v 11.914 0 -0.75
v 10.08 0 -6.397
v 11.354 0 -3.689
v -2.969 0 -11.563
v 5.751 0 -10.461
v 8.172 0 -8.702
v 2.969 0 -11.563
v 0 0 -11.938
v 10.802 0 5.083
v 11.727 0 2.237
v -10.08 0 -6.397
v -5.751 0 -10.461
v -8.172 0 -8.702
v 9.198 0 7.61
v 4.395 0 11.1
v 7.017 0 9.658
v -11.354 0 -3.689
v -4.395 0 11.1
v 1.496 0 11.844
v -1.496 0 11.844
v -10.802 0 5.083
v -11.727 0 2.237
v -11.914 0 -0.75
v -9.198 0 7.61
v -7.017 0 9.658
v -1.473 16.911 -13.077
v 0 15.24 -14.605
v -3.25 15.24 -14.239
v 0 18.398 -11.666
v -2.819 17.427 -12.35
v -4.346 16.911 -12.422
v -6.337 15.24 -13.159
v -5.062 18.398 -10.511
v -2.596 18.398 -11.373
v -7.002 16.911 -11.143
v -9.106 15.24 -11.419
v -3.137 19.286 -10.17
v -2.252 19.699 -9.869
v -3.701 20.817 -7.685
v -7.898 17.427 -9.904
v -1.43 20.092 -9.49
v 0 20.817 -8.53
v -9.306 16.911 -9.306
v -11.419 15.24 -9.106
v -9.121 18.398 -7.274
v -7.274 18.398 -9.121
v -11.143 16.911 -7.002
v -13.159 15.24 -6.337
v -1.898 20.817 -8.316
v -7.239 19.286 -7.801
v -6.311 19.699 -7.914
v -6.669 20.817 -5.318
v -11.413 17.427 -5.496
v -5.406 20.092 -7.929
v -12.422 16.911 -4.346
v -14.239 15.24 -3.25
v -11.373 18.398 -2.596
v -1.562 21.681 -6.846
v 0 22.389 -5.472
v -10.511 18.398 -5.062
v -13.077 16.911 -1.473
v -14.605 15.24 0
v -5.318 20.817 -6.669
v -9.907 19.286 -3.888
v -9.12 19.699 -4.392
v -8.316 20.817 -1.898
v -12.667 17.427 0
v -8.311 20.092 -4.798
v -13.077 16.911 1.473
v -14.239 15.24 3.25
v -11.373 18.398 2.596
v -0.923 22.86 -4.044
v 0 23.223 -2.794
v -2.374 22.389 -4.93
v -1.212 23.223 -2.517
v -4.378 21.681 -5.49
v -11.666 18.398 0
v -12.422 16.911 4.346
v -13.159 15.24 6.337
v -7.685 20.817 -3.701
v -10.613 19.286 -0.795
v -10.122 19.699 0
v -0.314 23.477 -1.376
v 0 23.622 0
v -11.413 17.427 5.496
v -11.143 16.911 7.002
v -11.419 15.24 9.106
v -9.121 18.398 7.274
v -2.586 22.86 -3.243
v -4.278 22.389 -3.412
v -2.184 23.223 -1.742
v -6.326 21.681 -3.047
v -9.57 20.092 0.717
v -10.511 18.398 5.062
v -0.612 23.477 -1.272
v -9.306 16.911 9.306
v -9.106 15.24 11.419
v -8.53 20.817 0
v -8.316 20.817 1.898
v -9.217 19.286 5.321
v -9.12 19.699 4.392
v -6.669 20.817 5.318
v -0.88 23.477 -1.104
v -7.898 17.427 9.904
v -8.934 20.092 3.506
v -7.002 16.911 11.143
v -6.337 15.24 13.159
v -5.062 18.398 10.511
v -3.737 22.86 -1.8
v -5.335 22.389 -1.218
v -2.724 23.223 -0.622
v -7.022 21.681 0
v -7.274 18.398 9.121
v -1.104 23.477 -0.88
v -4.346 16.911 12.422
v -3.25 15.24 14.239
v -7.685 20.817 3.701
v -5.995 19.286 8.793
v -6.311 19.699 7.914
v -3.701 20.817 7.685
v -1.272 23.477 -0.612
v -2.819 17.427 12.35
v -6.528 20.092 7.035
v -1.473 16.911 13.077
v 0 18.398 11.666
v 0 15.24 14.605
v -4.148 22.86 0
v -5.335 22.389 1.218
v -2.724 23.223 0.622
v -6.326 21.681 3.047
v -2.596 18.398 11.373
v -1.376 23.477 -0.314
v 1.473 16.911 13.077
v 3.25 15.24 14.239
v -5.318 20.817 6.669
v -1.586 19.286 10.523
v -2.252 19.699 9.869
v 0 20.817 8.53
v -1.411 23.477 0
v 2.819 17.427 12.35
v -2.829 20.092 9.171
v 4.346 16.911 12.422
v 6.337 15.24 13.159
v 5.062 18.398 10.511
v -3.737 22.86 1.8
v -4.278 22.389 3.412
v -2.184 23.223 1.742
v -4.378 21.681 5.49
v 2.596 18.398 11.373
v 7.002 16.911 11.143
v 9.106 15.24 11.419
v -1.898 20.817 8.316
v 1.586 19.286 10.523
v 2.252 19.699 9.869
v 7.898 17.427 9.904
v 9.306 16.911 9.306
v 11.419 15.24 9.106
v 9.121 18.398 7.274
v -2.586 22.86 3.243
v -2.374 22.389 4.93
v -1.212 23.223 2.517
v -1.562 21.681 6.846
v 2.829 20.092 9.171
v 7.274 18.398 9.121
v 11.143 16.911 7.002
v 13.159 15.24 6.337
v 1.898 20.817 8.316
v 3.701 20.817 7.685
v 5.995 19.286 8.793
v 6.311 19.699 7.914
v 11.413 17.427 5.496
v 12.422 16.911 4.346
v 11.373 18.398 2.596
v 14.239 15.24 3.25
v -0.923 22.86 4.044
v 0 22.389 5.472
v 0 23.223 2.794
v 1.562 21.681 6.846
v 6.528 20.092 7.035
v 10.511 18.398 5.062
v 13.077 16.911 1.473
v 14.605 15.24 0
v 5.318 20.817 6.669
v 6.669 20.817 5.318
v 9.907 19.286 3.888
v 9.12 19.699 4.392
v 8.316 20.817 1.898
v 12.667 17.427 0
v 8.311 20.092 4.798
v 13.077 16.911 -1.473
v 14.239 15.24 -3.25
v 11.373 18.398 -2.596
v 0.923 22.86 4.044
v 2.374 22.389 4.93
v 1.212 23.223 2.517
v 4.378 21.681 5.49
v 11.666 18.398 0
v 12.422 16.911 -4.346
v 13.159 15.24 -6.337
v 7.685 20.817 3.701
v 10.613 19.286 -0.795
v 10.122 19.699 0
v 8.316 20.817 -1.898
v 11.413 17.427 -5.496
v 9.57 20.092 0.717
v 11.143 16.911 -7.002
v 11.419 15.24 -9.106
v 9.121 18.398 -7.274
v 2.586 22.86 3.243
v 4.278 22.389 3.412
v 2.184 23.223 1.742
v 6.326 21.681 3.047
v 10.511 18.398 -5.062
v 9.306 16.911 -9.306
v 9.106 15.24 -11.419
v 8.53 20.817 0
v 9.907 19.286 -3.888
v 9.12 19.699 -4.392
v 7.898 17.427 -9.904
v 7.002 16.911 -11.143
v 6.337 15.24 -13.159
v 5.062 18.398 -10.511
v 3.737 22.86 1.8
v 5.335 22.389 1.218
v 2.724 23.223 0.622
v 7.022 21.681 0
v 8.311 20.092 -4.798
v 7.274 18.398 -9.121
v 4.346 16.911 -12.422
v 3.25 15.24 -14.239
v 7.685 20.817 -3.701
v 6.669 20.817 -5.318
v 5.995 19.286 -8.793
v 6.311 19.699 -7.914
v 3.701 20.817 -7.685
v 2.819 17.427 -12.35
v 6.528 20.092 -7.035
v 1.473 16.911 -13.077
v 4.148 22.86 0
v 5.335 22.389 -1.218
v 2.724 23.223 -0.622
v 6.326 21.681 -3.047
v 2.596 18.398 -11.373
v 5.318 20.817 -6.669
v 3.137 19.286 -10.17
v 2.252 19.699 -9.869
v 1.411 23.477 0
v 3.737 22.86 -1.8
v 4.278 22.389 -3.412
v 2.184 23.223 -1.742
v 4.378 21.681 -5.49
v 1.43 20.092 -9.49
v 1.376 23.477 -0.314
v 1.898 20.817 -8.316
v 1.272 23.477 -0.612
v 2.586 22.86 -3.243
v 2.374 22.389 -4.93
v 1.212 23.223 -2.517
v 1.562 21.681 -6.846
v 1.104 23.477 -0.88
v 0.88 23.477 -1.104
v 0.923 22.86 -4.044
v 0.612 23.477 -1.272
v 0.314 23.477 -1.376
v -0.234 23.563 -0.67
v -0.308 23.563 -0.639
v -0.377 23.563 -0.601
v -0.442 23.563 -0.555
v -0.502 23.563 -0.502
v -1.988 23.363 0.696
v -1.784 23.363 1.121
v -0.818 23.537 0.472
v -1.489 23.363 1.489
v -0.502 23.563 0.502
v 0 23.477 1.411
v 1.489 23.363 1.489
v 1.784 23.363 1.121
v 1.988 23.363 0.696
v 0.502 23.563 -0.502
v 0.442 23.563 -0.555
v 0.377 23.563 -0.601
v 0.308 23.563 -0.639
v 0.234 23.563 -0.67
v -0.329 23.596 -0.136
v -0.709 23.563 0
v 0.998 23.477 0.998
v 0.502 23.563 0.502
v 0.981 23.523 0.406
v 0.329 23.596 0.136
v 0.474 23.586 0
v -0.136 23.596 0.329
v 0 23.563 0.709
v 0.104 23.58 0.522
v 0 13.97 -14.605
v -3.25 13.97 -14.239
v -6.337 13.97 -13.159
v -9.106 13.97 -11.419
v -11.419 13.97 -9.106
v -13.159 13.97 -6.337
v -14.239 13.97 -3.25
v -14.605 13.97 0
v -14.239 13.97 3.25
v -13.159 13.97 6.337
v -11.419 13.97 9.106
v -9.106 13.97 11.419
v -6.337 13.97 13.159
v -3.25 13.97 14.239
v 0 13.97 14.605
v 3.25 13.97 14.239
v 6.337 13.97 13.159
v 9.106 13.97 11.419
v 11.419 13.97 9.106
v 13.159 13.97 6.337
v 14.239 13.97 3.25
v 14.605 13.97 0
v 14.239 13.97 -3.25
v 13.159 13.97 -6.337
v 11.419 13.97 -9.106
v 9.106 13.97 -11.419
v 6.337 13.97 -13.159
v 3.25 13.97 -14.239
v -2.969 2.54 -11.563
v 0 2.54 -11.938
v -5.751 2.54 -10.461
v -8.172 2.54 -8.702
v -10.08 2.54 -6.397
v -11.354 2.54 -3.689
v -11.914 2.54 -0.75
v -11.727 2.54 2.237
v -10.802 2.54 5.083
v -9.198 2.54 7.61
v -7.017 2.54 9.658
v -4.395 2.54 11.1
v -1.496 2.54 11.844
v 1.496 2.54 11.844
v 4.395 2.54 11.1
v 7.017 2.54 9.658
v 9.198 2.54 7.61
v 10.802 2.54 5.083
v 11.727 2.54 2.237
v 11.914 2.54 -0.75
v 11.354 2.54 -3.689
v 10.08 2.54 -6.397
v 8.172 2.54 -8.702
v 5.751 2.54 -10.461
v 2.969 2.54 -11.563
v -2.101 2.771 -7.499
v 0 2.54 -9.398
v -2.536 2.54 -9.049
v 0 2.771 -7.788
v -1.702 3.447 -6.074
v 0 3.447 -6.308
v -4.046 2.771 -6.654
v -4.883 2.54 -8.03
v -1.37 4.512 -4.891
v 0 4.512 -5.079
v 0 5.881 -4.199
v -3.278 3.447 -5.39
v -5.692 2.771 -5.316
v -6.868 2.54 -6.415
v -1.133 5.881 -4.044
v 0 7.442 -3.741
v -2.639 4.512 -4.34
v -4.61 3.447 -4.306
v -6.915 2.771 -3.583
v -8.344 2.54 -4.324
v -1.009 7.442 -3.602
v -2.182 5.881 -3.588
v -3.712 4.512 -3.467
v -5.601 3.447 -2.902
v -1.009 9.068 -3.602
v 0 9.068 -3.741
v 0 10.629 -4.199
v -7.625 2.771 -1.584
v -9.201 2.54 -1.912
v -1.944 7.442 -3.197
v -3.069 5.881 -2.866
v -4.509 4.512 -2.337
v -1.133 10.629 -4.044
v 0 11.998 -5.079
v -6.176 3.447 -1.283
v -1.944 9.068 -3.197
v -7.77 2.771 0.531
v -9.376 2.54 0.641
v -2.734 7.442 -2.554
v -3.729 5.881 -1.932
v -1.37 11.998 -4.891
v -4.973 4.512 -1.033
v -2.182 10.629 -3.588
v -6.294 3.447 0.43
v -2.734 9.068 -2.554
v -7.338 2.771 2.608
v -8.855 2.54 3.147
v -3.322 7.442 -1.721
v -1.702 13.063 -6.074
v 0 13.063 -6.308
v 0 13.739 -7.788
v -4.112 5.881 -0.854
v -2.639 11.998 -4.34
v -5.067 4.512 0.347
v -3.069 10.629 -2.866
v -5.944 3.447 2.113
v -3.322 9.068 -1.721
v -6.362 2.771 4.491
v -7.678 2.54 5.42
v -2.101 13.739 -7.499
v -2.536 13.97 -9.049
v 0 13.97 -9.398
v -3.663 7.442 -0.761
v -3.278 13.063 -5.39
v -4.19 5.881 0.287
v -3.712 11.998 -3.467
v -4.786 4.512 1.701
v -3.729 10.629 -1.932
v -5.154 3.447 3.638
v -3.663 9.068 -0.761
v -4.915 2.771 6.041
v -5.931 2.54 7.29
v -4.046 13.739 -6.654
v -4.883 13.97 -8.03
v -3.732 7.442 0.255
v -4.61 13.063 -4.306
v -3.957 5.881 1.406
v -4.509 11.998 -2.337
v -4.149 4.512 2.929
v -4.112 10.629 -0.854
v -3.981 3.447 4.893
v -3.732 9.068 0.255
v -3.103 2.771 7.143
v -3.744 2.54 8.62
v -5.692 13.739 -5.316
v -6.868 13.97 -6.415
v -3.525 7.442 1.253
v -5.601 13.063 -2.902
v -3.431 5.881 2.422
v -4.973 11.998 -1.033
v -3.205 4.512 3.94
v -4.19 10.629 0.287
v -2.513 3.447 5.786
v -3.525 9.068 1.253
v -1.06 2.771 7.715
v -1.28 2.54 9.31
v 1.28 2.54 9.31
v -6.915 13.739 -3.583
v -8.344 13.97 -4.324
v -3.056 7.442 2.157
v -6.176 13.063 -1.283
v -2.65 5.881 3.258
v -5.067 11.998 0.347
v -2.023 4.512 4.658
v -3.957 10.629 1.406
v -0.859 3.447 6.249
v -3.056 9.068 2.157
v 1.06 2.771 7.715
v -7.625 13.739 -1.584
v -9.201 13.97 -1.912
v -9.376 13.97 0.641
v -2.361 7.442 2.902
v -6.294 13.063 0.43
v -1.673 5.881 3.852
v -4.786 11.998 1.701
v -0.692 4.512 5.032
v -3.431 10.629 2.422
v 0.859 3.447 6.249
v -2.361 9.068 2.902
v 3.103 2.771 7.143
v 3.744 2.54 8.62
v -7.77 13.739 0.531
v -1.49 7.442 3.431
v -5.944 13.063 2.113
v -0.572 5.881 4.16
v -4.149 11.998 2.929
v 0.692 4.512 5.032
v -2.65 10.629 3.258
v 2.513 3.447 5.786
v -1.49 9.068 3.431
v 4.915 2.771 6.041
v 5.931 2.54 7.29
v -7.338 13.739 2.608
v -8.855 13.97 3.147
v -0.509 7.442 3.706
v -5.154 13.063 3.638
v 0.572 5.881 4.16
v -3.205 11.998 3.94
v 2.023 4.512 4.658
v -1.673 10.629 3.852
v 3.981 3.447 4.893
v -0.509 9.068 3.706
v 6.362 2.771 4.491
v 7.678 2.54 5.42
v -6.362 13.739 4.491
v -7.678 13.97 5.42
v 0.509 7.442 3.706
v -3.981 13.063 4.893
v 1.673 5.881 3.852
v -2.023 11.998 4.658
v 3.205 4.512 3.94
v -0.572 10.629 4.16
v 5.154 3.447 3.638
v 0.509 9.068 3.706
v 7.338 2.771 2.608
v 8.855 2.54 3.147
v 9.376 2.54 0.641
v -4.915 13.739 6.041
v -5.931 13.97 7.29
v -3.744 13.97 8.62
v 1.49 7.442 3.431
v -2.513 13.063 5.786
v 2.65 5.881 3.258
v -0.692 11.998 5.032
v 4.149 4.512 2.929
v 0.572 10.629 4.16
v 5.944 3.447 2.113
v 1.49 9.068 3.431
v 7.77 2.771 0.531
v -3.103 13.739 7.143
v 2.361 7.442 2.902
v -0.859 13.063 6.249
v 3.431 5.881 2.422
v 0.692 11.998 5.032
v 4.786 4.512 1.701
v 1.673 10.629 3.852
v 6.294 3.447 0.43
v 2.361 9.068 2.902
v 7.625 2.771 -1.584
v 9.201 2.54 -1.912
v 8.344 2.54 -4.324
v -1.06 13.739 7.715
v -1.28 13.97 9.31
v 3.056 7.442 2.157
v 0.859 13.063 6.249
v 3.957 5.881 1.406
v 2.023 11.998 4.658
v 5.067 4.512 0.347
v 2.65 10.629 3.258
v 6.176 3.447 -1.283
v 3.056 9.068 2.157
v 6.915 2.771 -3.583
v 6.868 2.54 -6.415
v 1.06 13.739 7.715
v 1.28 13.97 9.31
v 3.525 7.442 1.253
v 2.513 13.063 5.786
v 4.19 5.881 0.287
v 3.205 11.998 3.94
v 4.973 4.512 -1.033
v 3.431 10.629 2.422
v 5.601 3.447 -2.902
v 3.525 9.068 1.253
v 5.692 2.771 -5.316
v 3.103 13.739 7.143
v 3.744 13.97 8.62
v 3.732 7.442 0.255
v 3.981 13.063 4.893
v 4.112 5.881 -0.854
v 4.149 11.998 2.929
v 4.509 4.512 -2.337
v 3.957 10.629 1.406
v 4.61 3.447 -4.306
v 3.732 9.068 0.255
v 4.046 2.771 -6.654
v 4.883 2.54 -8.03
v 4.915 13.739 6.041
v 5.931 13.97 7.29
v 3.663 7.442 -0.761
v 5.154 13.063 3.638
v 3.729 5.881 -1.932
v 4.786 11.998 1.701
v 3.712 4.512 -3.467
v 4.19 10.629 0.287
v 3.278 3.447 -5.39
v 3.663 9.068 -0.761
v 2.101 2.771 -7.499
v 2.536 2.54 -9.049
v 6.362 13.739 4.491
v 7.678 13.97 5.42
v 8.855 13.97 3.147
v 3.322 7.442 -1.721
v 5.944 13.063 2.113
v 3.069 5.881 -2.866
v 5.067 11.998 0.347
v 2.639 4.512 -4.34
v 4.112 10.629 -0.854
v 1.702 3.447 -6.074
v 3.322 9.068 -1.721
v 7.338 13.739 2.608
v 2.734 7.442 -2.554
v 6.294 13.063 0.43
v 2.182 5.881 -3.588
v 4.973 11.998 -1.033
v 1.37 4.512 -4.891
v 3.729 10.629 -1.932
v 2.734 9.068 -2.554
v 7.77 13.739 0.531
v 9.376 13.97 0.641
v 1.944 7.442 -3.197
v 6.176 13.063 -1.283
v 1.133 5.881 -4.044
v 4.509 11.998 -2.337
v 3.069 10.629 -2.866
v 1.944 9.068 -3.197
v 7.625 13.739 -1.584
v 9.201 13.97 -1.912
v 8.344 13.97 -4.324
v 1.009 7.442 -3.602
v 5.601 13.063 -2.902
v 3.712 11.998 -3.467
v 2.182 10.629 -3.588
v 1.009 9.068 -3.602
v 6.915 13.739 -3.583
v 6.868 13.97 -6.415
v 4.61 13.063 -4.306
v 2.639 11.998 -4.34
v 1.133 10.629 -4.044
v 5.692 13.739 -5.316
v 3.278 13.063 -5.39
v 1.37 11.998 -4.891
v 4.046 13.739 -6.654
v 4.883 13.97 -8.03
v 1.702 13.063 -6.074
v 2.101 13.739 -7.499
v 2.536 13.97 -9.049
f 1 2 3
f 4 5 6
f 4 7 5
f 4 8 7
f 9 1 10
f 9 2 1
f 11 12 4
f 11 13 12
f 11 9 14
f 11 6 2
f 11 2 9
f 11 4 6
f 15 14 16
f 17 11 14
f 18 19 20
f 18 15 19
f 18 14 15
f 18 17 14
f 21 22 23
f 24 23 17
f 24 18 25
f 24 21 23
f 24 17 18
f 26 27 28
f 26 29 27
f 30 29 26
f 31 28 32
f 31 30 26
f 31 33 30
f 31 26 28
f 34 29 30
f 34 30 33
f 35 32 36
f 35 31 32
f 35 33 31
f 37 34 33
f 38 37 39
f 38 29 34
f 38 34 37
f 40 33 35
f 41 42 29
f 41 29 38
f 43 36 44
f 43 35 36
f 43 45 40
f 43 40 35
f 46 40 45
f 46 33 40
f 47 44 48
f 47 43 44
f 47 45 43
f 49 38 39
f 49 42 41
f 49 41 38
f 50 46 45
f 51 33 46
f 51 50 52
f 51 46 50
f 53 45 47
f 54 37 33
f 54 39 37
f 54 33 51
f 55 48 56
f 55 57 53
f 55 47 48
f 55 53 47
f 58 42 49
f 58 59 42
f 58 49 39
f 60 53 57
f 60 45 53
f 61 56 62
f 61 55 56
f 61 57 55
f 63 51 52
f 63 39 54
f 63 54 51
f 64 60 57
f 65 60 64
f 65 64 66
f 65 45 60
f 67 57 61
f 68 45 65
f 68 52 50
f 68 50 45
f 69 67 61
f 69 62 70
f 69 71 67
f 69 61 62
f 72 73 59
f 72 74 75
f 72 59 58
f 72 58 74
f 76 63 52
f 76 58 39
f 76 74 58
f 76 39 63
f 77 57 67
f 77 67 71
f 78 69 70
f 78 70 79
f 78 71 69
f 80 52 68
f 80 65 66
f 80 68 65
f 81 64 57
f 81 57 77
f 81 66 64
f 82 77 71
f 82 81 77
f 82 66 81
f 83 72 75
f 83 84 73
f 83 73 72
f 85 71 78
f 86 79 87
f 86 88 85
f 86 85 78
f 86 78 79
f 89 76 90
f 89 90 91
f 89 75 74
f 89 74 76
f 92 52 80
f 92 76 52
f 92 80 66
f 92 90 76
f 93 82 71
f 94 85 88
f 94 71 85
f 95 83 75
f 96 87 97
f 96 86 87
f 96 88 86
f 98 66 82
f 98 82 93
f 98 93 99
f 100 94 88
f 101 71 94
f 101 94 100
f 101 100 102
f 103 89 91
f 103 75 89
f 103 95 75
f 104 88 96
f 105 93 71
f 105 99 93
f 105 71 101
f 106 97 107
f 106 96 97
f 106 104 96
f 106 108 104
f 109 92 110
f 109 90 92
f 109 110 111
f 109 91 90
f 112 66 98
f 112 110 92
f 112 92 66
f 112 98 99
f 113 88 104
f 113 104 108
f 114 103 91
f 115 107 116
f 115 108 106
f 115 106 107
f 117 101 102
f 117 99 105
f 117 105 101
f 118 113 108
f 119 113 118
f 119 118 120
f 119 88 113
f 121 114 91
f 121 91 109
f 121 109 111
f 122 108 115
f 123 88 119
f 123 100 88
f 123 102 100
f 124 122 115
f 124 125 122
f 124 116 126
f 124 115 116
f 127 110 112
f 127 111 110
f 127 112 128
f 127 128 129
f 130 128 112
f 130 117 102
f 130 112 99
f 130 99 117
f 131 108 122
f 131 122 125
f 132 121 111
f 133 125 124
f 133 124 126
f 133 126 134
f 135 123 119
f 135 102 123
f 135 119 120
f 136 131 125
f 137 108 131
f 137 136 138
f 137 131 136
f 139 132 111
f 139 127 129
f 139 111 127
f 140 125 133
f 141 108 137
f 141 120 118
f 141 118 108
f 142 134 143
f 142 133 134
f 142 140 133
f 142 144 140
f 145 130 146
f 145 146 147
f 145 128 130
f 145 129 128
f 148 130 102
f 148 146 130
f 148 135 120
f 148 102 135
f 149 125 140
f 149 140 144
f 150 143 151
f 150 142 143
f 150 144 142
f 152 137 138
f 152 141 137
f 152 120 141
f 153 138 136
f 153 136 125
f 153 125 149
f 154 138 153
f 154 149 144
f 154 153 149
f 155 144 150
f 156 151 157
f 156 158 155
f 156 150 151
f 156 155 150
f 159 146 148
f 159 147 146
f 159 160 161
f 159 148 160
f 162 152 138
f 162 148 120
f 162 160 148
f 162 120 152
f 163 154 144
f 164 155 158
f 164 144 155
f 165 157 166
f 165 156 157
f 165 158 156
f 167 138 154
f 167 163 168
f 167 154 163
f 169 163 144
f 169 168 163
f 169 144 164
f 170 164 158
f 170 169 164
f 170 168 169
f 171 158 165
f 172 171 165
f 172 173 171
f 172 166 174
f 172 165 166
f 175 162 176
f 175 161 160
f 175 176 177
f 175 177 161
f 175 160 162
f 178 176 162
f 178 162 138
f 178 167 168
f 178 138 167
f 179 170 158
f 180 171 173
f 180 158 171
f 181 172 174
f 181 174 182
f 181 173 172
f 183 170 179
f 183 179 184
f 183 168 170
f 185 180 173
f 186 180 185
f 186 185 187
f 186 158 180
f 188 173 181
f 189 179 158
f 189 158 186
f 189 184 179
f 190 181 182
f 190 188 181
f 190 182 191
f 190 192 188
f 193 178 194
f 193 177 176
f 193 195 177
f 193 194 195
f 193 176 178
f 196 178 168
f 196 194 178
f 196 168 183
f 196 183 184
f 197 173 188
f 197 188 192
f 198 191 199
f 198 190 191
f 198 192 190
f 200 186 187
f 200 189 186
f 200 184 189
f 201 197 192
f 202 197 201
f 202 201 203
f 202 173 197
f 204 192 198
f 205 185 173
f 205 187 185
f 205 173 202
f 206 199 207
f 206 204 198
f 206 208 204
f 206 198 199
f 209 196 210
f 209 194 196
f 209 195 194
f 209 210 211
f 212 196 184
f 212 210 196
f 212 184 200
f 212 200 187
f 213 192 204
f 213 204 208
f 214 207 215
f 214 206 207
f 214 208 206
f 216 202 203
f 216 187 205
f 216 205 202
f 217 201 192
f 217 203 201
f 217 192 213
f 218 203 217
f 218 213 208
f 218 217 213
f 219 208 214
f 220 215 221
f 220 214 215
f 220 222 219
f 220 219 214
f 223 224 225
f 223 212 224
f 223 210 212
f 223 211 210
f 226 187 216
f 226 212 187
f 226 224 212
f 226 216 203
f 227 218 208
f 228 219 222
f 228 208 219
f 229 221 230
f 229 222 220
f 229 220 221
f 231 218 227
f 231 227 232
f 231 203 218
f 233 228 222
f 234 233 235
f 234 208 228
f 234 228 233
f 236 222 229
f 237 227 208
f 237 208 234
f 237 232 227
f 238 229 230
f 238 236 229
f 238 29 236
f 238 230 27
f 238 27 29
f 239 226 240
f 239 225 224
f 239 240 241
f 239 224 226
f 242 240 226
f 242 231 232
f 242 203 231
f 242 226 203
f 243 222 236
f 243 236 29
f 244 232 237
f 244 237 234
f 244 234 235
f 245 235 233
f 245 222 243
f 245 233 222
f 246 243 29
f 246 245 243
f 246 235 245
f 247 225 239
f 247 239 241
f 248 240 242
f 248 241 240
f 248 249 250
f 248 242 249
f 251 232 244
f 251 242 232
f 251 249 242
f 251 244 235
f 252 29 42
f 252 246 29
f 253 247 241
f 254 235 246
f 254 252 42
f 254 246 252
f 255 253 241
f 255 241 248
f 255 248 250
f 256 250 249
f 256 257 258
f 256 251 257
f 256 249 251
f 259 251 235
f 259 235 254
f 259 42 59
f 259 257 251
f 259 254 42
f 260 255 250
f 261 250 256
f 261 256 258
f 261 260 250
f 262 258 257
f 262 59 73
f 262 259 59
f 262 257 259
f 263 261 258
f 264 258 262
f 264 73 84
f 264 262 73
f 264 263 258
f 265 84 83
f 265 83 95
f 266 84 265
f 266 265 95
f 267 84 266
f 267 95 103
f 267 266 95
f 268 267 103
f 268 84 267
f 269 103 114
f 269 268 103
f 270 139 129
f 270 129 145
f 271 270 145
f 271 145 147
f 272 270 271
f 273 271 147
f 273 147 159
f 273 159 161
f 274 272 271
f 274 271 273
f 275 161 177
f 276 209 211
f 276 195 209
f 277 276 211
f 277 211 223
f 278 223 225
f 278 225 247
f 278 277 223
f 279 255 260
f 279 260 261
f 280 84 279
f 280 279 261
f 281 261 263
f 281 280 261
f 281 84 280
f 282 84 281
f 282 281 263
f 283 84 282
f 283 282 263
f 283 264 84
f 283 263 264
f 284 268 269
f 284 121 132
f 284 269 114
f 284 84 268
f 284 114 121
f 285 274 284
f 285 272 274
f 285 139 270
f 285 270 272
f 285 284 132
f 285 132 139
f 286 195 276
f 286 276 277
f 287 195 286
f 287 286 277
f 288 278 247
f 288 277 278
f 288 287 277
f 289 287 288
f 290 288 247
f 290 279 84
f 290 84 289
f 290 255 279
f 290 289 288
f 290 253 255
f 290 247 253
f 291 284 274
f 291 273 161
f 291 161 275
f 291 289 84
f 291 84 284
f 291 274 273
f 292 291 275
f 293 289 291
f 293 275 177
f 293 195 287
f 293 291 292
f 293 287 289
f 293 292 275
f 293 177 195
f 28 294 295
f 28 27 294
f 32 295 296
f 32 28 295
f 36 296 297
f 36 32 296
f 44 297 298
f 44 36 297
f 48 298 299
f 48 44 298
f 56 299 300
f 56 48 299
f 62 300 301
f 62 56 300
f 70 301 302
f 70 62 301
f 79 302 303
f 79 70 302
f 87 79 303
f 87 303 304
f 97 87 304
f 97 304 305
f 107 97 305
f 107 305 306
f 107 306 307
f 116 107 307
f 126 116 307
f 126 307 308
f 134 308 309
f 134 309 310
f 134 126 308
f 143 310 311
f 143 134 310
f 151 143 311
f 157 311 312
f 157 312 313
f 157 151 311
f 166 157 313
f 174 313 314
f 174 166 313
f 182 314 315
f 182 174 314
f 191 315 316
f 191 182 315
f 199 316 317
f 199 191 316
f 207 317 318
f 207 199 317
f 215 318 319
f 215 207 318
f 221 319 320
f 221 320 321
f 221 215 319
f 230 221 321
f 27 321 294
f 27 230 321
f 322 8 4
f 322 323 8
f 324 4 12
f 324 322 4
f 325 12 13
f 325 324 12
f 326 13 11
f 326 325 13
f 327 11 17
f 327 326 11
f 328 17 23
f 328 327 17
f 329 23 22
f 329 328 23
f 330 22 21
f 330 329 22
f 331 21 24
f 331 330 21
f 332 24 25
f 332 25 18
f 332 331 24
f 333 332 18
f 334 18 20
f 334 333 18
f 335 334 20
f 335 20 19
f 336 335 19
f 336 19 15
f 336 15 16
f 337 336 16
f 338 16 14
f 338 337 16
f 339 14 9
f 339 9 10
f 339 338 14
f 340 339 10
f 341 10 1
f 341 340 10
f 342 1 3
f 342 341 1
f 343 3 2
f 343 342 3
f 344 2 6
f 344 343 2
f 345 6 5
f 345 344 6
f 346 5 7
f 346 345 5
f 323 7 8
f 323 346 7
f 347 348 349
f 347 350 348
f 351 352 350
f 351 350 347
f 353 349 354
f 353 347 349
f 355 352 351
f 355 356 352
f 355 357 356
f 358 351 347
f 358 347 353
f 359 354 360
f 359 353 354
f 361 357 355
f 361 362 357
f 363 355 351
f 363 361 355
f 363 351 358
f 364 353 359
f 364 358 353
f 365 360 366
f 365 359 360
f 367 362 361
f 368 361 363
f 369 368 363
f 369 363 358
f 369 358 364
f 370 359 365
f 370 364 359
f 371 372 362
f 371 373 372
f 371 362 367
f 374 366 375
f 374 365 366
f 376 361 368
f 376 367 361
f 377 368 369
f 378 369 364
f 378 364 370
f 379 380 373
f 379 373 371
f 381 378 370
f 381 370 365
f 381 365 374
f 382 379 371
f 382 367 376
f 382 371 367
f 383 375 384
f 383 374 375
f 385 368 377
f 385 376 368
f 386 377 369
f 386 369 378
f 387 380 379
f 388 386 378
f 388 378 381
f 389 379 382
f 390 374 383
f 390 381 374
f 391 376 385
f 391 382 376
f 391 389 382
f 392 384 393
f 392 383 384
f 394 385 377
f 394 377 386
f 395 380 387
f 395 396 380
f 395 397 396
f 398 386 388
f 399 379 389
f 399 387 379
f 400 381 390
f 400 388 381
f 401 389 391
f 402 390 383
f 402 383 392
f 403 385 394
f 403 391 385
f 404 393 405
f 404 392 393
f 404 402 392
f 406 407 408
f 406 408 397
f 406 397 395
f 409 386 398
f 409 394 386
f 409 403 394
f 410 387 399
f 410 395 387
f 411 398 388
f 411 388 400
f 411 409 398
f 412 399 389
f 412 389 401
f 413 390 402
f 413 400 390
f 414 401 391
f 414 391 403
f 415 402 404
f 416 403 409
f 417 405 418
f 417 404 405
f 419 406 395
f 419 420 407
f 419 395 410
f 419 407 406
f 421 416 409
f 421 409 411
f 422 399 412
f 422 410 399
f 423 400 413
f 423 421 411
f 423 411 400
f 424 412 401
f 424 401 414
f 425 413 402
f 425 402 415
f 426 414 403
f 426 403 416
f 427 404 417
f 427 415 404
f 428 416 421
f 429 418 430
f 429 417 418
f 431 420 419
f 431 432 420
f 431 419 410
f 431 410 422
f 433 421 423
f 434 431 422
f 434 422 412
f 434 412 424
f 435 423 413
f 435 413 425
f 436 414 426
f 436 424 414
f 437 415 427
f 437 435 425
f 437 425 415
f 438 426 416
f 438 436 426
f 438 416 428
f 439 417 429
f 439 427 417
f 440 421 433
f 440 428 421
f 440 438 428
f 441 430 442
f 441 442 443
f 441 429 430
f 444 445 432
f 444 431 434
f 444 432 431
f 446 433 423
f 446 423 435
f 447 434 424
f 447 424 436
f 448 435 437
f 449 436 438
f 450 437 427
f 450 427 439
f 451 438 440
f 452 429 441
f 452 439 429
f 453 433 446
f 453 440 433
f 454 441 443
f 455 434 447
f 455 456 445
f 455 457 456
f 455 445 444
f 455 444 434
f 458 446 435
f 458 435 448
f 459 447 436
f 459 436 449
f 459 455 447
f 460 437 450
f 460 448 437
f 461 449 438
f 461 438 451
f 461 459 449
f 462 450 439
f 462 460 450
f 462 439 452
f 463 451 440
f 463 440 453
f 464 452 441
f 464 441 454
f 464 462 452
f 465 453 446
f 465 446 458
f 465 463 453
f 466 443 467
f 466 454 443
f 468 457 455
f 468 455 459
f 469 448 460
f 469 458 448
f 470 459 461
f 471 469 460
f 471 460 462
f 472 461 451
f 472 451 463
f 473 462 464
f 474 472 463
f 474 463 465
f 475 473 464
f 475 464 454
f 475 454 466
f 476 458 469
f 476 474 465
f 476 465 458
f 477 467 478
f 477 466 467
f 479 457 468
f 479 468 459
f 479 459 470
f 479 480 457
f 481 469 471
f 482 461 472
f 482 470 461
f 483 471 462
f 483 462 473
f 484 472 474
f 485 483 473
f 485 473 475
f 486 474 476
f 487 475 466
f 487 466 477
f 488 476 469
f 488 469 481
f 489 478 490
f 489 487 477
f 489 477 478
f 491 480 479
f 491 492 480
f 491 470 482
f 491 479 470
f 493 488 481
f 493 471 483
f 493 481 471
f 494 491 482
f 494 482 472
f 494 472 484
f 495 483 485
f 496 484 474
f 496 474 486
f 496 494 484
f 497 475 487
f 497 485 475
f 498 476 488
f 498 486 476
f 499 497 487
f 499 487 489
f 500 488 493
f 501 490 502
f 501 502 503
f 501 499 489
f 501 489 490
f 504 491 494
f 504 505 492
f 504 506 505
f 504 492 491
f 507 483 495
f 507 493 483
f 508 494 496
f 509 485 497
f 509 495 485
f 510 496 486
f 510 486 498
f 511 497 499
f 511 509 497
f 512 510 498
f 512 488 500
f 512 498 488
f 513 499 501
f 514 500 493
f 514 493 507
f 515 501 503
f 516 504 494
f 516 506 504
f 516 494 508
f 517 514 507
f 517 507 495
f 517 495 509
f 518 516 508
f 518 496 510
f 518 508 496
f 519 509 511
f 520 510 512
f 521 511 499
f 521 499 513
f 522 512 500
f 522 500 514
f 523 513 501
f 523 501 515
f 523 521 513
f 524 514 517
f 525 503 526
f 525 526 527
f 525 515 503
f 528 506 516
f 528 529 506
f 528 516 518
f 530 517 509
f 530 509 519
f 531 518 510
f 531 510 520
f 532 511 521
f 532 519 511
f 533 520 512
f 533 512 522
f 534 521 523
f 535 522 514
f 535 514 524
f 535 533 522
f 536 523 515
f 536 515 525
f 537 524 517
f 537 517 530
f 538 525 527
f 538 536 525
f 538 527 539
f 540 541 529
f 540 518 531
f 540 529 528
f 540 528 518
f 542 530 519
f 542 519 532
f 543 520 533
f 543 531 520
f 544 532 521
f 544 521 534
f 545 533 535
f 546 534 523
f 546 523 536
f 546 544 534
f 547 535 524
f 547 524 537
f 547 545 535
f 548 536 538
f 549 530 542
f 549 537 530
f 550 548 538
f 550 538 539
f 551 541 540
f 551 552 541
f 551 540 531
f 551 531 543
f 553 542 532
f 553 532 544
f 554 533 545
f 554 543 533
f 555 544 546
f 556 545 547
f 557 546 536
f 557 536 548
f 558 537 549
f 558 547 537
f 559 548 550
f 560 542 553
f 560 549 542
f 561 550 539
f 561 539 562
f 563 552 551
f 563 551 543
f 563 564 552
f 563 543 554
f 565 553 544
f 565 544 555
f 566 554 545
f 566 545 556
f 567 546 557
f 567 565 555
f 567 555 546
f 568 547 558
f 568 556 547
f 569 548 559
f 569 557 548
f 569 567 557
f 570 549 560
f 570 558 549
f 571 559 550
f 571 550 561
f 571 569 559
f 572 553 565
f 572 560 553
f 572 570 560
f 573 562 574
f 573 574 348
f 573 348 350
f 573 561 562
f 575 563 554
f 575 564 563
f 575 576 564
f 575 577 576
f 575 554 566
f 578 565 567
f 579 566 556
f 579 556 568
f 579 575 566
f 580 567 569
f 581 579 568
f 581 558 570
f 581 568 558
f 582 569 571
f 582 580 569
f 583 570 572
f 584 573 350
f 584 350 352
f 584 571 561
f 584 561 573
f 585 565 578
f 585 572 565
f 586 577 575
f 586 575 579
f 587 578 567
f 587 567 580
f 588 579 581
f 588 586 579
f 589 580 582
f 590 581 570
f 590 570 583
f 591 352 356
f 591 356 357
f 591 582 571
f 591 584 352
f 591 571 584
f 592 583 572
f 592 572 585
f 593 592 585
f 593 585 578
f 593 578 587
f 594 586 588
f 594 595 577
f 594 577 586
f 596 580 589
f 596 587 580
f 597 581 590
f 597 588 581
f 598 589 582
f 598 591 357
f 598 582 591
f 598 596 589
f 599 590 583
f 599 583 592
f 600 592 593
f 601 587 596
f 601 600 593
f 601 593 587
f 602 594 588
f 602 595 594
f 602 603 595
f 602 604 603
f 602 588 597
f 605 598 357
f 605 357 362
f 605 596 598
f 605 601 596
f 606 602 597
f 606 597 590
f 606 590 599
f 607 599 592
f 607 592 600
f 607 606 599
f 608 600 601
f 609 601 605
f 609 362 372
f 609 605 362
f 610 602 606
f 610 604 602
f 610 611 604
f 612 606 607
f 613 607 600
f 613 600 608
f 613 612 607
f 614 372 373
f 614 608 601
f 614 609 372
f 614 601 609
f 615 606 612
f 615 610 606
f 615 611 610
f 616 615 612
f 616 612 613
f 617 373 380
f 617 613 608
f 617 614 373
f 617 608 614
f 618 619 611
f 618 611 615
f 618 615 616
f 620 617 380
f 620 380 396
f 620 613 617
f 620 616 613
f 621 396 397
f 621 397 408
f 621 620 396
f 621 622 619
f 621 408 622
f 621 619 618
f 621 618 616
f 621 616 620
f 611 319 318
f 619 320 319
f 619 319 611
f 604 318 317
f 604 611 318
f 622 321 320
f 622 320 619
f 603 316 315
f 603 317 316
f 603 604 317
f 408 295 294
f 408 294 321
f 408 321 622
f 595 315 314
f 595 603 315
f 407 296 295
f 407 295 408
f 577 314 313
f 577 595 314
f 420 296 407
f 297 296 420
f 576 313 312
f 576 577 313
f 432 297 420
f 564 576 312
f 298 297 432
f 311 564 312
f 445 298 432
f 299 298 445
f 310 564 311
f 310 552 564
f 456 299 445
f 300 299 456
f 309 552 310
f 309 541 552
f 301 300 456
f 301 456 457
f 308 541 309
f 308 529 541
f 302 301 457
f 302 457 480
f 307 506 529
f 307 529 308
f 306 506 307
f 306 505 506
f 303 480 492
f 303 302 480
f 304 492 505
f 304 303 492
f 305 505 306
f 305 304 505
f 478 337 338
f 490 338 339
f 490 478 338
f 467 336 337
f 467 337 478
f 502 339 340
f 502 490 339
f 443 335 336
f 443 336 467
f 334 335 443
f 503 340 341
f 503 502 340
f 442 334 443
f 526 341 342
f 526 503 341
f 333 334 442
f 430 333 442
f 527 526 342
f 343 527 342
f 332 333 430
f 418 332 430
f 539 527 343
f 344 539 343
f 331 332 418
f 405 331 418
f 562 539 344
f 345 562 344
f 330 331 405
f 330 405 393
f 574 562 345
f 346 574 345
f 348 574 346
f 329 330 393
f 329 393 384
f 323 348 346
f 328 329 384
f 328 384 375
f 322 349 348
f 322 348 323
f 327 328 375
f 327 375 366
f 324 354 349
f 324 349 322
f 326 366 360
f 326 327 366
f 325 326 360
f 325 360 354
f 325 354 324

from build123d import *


with BuildPart() as part:
    # Sketch1 → Revolve1 (revolve)
    with BuildSketch(Plane.XY, mode=Mode.PRIVATE) as revolve1_sk:
        with BuildLine():
            Line((0, 0), (-11.938, 0))
            Line((-11.938, 0), (-11.938, 2.54))
            Line((-11.938, 2.54), (-9.398, 2.54))
            ThreePointArc((-9.398, 2.54), (-3.683, 8.255), (-9.398, 13.97))
            Line((-9.398, 13.97), (-14.605, 13.97))
            Line((-14.605, 13.97), (-14.605, 15.24))
            add(Edge.make_bspline(
                [(-14.605, 15.24), (-8.278988418, 23.094212904), (0, 23.622)],
                knots=[0, 0, 0, 0.874066548, 0.874066548, 0.874066548], degree=2))
            Line((0, 23.622), (0, 0))
        make_face()
    revolve(revolve1_sk.sketch.rotate(Axis((0, 0, 0), (0, 1, 0)), 270), axis=Axis((0, 0, 0), (0, 1, 0)))


solid = part.part
